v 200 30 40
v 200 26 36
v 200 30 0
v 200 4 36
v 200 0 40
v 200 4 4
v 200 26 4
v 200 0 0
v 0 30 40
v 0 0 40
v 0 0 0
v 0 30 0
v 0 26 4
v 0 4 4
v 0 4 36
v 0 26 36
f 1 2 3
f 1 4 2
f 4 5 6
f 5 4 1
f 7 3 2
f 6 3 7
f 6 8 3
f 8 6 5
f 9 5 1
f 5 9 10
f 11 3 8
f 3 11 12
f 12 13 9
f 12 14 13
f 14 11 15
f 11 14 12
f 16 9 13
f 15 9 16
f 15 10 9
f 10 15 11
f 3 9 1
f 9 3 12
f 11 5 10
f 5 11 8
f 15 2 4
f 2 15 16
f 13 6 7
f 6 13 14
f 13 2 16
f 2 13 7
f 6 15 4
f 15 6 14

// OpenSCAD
$fn = 32;

// ----------------------------------------------------------------------
// Box beam: 200-250 mm hollow beam
// ----------------------------------------------------------------------

// --- parameters (mm) ---
beam_l = 200;             // beam length, X
beam_w = 30;              // beam width, Y
beam_h = 40;              // beam height, Z
wall = 4;                 // wall thickness

difference() {
  cube([beam_l, beam_w, beam_h]);
  translate([-1, wall, wall])
    cube([beam_l + 2, beam_w - 2 * wall, beam_h - 2 * wall]);
}
